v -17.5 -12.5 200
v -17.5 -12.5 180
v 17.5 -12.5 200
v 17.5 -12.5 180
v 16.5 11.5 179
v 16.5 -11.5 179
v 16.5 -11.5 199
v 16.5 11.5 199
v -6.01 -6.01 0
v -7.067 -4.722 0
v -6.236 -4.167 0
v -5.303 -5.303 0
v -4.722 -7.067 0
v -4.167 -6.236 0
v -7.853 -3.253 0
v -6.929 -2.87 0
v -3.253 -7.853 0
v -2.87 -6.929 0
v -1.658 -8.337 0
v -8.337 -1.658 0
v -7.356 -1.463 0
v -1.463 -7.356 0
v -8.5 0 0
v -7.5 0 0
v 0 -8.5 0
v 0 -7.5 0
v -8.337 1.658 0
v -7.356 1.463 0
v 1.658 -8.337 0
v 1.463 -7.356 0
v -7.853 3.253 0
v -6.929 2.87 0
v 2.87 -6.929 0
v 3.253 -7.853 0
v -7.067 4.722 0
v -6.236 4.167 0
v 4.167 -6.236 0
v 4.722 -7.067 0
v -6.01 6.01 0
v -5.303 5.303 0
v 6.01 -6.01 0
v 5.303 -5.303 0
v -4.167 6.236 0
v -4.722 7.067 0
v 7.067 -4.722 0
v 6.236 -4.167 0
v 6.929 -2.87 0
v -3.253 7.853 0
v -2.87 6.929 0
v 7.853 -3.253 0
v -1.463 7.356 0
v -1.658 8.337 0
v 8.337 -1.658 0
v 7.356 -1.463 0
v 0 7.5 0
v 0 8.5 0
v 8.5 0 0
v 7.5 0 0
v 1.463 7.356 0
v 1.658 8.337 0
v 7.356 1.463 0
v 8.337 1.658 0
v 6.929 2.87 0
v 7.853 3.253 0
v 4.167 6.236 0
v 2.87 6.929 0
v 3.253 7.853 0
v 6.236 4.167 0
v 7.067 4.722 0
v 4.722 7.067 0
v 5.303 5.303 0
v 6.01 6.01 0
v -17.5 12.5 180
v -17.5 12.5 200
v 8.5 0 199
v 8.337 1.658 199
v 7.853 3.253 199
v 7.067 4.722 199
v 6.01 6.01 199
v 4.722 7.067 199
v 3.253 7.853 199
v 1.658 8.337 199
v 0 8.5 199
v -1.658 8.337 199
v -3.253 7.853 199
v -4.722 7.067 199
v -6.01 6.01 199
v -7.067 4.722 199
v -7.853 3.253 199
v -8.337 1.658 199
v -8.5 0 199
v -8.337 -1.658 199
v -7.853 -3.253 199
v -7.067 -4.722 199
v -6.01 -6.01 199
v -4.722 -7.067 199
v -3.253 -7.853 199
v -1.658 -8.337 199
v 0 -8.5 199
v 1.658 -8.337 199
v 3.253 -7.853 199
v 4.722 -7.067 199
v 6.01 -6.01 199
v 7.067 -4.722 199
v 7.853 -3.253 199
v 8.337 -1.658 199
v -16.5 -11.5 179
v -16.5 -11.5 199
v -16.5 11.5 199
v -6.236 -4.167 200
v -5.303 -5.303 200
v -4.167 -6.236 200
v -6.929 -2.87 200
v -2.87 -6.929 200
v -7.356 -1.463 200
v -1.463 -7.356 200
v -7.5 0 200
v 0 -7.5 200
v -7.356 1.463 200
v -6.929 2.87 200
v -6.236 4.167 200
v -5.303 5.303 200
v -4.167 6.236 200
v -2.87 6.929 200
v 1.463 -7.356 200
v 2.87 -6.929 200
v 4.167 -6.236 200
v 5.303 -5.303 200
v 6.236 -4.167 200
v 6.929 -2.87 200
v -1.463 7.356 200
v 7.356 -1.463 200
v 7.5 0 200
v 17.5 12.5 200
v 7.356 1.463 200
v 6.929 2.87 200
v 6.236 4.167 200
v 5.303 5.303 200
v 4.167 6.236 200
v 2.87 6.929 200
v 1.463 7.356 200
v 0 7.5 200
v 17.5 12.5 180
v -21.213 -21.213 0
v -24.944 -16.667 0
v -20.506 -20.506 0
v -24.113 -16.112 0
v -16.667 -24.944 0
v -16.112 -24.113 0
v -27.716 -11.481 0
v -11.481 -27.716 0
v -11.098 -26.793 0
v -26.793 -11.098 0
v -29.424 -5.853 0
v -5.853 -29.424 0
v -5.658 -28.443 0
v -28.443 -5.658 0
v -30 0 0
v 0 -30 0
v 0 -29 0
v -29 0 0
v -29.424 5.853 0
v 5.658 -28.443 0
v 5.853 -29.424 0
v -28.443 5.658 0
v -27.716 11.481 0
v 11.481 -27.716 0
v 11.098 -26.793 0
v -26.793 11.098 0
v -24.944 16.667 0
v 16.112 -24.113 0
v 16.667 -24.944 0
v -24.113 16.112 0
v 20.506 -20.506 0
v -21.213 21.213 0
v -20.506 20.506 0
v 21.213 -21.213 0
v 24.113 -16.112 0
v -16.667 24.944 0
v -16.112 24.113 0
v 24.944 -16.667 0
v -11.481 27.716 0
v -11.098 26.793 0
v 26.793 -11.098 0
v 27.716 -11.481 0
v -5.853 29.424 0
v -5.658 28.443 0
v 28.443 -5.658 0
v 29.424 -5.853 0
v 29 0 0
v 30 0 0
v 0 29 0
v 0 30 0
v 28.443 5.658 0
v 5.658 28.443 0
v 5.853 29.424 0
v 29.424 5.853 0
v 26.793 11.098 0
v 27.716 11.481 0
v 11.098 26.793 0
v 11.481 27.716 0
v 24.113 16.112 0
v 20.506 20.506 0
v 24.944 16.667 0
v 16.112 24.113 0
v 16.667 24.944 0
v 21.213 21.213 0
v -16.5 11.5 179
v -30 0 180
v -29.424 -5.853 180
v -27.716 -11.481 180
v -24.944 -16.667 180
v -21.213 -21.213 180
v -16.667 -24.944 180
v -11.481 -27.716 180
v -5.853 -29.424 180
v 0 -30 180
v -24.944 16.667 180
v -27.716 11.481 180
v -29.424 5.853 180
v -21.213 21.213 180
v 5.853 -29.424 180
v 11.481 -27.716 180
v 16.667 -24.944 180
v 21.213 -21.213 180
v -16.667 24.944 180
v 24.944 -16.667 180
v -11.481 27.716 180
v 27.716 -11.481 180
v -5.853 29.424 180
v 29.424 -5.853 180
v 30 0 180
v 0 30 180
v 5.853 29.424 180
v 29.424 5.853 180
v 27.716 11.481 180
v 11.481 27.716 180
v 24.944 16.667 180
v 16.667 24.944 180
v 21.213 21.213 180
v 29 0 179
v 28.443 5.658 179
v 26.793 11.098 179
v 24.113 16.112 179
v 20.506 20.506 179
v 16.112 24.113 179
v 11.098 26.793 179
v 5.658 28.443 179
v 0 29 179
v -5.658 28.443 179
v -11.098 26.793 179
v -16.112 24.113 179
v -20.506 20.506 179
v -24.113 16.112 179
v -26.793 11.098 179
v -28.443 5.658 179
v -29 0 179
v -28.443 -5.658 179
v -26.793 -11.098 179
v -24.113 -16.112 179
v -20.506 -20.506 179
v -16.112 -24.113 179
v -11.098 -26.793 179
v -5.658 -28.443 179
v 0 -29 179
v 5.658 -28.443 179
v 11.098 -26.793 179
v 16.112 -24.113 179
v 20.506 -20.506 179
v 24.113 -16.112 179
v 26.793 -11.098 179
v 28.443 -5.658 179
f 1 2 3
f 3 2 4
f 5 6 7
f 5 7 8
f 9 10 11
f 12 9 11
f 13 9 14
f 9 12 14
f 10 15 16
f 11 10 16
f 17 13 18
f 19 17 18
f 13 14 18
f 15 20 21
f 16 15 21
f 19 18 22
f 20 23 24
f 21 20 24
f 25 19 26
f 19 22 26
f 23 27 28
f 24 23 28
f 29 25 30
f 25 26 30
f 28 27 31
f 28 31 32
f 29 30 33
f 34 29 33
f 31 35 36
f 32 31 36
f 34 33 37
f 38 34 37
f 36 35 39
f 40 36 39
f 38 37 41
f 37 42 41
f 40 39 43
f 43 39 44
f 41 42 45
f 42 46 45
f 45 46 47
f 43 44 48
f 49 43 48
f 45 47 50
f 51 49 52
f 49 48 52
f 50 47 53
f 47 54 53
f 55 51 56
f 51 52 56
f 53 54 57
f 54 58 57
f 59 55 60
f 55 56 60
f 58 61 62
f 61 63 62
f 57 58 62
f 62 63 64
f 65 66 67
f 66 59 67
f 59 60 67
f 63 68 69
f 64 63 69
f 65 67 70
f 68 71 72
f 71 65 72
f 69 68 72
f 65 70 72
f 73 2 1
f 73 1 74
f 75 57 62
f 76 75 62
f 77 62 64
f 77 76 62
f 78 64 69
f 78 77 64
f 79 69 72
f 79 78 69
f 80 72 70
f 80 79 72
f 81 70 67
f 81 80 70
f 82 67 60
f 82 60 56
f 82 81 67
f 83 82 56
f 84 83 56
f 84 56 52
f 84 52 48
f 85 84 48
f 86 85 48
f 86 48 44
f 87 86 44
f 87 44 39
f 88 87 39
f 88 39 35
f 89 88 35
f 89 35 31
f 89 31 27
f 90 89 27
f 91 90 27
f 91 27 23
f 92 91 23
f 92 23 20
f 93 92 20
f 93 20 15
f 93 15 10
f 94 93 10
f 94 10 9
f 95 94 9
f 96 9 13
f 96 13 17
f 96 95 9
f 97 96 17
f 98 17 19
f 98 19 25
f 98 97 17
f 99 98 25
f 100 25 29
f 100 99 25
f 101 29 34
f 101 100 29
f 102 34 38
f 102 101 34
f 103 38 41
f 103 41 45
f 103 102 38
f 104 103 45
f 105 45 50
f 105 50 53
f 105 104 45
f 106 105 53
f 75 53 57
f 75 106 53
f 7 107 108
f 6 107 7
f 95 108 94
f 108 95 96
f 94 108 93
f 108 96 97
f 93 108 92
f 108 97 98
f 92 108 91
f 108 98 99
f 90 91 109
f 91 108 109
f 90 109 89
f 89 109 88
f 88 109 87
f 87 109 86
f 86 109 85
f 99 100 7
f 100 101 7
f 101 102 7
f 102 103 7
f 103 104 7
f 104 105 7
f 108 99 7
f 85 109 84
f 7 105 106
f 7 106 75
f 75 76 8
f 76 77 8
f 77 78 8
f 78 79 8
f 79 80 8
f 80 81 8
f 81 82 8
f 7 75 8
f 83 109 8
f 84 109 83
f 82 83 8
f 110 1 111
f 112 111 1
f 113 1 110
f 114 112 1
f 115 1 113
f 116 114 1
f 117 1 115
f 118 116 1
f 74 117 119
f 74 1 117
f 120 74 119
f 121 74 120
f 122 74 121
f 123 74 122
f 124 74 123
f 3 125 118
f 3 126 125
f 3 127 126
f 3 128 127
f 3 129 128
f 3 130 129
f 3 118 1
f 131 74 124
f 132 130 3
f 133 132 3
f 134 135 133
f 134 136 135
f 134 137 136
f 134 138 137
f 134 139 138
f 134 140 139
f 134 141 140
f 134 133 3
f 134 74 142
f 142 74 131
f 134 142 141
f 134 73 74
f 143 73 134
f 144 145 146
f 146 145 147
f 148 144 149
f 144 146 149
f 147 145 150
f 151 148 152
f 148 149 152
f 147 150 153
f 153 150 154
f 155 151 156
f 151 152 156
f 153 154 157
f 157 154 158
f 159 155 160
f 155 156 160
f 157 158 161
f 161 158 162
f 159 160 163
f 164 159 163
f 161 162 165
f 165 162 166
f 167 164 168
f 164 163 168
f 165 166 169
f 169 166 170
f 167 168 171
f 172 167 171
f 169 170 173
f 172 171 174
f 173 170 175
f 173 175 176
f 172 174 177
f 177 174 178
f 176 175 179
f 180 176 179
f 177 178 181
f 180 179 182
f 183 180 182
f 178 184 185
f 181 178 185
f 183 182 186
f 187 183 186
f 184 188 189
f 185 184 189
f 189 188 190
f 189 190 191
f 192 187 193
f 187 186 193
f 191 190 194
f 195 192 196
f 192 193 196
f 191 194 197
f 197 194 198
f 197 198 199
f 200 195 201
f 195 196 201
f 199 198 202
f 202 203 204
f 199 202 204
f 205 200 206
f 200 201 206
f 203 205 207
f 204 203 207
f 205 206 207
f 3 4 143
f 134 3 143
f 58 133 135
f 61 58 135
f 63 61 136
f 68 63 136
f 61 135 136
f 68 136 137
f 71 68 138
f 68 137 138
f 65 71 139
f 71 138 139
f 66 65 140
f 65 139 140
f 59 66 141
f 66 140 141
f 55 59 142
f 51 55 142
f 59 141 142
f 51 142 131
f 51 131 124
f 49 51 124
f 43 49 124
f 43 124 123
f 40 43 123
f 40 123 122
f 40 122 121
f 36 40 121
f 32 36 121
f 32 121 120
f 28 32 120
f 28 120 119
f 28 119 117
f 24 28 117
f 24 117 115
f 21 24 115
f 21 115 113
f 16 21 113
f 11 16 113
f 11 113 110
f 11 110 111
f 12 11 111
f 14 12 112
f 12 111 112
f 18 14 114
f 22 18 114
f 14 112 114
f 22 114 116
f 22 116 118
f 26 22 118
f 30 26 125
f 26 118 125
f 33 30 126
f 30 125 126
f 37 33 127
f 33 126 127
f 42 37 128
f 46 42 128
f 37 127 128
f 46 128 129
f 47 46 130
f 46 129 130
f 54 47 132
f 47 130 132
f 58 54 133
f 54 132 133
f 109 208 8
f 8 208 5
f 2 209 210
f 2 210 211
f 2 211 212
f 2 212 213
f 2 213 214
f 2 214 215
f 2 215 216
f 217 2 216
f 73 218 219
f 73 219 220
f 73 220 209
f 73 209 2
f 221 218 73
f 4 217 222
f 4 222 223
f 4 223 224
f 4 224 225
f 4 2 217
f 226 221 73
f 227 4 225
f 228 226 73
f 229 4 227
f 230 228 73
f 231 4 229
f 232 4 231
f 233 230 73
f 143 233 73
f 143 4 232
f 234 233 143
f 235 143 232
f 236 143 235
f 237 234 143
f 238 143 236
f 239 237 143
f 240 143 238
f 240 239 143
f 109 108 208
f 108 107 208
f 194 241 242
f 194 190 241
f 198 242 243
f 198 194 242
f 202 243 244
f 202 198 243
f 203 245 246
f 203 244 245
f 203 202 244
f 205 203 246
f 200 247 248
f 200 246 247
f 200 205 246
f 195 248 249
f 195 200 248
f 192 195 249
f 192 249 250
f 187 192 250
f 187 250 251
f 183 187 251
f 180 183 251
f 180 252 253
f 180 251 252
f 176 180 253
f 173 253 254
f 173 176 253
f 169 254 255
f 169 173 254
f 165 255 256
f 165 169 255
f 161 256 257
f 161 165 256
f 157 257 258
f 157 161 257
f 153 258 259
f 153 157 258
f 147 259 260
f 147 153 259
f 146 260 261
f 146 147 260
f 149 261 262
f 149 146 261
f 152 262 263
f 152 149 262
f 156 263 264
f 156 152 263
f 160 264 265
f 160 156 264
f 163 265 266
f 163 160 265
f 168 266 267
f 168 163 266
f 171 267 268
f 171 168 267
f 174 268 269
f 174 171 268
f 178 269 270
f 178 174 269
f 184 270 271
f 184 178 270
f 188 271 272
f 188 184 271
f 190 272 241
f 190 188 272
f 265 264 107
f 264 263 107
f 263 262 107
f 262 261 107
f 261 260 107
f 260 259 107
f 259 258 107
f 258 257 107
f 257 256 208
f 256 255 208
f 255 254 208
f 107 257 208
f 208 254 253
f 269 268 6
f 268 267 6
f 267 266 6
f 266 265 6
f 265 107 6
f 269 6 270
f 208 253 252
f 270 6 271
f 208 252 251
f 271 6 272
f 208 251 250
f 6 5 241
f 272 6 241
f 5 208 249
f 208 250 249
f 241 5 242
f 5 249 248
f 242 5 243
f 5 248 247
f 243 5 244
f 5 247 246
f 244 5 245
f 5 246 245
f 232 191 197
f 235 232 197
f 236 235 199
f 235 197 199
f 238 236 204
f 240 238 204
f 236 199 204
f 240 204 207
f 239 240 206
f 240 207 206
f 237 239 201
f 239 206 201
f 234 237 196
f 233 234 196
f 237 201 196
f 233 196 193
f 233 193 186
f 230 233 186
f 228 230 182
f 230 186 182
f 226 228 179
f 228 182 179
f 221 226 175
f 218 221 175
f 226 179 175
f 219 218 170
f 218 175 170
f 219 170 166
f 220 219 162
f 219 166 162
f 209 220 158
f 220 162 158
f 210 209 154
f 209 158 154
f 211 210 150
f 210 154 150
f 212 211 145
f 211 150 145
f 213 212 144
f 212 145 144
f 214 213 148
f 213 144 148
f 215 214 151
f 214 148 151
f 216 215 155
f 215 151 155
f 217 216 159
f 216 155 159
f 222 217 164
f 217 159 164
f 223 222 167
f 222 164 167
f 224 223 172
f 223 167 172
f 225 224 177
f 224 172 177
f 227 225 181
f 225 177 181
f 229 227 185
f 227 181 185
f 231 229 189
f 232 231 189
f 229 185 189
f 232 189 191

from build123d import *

# Parameters (mm, degrees)
SKETCH9_R            = 30
BOSS_EXTRUDE11_DEPTH = 180
SKETCH10_W           = 35
SKETCH10_H           = 25
BOSS_EXTRUDE12_DEPTH = 20
SKETCH11_R           = 7.5
CUT_EXTRUDE2_DEPTH   = 201
SHELL1_T             = -1


with BuildPart() as part:
    # Sketch9 → Boss-Extrude11 (new body)
    with BuildSketch(Plane.XY):
        Circle(SKETCH9_R)
    extrude(amount=BOSS_EXTRUDE11_DEPTH)

    # Sketch10 → Boss-Extrude12 (add)
    with BuildSketch(Plane.XY.offset(180)):
        Rectangle(SKETCH10_W, SKETCH10_H)
    extrude(amount=BOSS_EXTRUDE12_DEPTH)

    # Sketch11 → Cut-Extrude2 (cut, through all)
    with BuildSketch(Plane.XY.offset(200)):
        Circle(SKETCH11_R)
    extrude(amount=-CUT_EXTRUDE2_DEPTH, mode=Mode.SUBTRACT)

    # Shell1
    shell1_openings = [part.faces().sort_by_distance(p)[0] for p in [
        (7.5, 0, 0),
    ]]
    offset(amount=SHELL1_T, openings=shell1_openings, kind=Kind.INTERSECTION)


solid = part.part
